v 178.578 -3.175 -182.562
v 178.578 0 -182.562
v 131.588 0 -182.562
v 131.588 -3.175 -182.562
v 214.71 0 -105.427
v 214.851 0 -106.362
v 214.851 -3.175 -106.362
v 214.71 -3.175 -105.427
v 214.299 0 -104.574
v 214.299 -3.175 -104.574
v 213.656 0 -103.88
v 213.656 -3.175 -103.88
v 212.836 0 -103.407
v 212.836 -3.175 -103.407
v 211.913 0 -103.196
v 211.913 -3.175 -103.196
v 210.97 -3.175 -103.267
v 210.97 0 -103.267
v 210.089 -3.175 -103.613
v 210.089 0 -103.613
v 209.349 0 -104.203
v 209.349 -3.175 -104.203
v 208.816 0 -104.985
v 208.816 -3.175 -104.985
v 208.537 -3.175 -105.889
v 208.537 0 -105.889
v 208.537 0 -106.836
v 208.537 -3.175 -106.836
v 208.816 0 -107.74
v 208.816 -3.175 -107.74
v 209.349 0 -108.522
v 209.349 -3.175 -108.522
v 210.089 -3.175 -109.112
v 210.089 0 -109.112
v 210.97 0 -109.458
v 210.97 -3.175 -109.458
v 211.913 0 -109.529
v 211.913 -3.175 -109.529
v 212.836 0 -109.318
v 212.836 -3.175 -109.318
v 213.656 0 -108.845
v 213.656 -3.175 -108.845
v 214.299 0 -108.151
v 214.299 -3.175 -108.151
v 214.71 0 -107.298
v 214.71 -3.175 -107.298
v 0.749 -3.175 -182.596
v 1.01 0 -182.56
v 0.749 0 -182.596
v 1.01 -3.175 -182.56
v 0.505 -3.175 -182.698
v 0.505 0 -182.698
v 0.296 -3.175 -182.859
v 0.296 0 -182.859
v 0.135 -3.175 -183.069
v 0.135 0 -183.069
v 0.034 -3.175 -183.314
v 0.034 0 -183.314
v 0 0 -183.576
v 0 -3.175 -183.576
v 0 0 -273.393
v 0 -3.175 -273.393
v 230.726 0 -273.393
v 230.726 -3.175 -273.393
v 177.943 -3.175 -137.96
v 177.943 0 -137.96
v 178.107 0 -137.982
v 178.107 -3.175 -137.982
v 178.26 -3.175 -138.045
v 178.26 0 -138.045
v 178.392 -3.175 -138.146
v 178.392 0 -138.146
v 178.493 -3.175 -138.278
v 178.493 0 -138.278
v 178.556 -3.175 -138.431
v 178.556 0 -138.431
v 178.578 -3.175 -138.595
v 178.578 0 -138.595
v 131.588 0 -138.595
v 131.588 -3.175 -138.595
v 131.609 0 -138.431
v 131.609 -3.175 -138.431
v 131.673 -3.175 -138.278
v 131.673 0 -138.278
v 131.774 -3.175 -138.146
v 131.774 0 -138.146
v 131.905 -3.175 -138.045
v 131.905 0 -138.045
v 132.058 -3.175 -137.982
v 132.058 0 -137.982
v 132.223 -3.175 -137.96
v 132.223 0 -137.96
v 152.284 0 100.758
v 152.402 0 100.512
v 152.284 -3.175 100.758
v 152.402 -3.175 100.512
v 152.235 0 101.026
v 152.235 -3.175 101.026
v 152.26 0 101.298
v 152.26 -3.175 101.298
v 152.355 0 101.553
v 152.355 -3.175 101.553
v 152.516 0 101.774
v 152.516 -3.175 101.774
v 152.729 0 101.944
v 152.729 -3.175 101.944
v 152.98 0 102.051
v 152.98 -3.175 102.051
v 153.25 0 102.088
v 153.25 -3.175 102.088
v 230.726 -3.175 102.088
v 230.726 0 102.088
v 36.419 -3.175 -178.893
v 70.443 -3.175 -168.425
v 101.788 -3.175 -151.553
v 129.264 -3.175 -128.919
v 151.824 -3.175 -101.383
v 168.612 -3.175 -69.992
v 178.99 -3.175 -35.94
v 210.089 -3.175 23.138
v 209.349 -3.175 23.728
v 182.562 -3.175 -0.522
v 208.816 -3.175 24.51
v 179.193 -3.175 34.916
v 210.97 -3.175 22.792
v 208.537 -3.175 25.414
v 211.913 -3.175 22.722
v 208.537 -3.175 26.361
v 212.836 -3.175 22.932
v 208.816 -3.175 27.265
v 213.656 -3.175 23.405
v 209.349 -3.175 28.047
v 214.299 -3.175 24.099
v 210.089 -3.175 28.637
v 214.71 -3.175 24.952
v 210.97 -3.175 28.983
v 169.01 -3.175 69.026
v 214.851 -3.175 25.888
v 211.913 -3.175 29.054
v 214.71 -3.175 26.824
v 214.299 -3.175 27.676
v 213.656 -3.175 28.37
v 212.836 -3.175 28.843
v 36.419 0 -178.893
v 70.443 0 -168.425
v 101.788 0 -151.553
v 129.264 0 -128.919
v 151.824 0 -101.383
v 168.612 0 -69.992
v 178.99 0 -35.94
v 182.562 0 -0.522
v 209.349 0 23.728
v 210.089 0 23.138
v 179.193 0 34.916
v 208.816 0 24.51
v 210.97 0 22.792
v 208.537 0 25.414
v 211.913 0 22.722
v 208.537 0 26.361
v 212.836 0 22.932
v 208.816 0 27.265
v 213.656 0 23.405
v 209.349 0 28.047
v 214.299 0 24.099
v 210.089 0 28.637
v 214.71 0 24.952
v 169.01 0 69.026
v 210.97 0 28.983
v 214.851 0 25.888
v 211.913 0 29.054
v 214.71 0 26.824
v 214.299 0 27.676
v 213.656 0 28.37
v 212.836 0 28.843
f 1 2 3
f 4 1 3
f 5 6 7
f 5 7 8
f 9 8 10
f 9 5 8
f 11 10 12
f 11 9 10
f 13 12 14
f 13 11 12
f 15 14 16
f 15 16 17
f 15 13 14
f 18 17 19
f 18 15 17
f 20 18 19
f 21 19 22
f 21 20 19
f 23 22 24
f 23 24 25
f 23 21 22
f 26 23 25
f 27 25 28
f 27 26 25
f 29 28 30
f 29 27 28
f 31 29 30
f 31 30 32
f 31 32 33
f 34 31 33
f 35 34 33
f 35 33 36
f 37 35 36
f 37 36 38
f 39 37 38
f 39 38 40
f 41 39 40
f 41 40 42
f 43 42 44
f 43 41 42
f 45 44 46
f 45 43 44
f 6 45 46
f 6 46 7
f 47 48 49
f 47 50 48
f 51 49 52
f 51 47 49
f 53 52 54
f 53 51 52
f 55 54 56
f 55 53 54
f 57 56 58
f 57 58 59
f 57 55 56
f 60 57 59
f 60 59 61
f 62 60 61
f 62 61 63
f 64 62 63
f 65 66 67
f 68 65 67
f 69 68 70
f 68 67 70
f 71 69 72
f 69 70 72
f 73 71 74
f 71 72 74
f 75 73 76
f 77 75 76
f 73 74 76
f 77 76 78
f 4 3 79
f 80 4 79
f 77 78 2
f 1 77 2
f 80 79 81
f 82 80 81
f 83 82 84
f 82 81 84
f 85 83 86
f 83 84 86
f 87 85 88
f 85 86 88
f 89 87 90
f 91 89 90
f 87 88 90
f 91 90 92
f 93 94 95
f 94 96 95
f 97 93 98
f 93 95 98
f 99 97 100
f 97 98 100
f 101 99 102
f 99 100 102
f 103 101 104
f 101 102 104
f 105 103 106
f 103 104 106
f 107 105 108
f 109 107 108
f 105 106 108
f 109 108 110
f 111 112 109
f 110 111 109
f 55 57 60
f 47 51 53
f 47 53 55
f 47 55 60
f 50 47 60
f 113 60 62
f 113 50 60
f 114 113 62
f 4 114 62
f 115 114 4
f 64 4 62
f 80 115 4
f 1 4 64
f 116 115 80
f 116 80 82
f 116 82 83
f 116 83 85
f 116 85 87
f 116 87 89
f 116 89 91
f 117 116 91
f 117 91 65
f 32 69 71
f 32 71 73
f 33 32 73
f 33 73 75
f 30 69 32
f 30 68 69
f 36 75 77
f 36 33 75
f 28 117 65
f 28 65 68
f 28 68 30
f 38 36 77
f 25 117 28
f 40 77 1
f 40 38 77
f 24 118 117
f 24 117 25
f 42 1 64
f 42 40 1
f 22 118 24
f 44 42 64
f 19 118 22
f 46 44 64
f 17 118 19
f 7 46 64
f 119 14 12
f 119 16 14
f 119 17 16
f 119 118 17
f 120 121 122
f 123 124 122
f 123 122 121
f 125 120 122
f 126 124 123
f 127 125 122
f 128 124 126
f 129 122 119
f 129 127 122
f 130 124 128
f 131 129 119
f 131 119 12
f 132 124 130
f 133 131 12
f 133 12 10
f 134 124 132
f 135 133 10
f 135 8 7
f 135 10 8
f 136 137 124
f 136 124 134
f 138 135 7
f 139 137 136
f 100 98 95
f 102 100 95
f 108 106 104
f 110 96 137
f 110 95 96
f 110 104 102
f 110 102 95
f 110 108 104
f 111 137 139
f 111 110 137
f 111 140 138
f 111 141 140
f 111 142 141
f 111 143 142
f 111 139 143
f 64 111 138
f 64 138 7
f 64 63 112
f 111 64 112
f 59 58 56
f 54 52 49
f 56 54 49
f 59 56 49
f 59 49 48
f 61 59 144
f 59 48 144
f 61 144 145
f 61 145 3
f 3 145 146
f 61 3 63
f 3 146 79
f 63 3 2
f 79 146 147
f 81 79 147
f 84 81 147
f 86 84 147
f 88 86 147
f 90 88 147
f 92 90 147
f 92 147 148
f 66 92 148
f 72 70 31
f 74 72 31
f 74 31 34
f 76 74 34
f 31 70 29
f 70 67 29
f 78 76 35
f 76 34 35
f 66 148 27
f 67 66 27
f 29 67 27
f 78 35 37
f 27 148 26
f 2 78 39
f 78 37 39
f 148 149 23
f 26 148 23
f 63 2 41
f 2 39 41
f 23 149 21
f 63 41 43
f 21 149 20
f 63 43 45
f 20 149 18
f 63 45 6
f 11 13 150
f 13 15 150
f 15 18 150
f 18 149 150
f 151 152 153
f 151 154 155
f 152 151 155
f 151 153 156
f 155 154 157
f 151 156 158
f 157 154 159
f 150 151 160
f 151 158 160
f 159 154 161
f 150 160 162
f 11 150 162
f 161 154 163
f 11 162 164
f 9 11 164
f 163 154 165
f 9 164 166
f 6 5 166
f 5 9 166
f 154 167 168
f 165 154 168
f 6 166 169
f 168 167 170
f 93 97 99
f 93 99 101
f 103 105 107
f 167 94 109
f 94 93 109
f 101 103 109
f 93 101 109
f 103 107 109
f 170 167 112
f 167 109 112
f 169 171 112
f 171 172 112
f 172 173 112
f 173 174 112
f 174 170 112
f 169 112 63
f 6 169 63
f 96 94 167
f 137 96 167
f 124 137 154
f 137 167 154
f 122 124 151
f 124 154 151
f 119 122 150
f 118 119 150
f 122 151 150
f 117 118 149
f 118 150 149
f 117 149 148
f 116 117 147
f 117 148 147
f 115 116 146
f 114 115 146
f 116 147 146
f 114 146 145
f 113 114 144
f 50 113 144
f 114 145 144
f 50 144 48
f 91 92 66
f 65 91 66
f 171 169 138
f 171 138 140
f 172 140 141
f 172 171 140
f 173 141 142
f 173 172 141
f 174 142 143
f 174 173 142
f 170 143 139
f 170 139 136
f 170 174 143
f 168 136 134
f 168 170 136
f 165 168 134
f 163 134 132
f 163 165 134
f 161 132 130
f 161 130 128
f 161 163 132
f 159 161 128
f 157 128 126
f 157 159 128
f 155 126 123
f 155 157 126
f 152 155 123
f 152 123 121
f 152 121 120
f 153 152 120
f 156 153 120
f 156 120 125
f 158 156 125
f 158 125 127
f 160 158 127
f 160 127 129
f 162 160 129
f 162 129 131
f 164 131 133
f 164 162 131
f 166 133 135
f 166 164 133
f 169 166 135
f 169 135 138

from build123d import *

# Parameters (mm, degrees)
F0_R     = 3.175
F1_DEPTH = 3.175
F3_R     = 1.016


with BuildPart() as f1:
    # F0 (on Front) → F1 (new body)
    with BuildSketch(Plane.XZ):
        with BuildLine():
            ThreePointArc((151.351172, 102.087654), (161.19312, -85.707902), (0, -182.5625))
            Line((0, -182.5625), (0, -273.3929))
            Line((0, -273.3929), (230.726172, -273.3929))
            Line((230.726172, -273.3929), (230.726172, -182.5625))
            Line((230.726172, -182.5625), (230.726172, 102.087654))
            Line((230.726172, 102.087654), (151.351172, 102.087654))
        make_face()
        with BuildLine():
            ThreePointArc((131.587777, -138.5951), (131.773765, -138.146087), (132.222777, -137.9601))
            Line((132.222777, -137.9601), (177.942777, -137.9601))
            ThreePointArc((177.942777, -137.9601), (178.39179, -138.146087), (178.577777, -138.5951))
            Line((178.577777, -138.5951), (178.577777, -182.5625))
            Line((178.577777, -182.5625), (131.587777, -182.5625))
            Line((131.587777, -182.5625), (131.587777, -138.5951))
        make_face(mode=Mode.SUBTRACT)
        with Locations((211.676172, -106.3625)):
            Circle(F0_R, mode=Mode.SUBTRACT)
        with Locations((211.676172, 25.887654)):
            Circle(F0_R, mode=Mode.SUBTRACT)
    extrude(amount=F1_DEPTH)

    # F3
    f3_edges = [f1.edges().sort_by_distance(p)[0] for p in [
        (151.351172, -1.5875, 102.087654),
        (0, -1.5875, -182.5625),
    ]]
    fillet(f3_edges, radius=F3_R)


solid = f1.part
